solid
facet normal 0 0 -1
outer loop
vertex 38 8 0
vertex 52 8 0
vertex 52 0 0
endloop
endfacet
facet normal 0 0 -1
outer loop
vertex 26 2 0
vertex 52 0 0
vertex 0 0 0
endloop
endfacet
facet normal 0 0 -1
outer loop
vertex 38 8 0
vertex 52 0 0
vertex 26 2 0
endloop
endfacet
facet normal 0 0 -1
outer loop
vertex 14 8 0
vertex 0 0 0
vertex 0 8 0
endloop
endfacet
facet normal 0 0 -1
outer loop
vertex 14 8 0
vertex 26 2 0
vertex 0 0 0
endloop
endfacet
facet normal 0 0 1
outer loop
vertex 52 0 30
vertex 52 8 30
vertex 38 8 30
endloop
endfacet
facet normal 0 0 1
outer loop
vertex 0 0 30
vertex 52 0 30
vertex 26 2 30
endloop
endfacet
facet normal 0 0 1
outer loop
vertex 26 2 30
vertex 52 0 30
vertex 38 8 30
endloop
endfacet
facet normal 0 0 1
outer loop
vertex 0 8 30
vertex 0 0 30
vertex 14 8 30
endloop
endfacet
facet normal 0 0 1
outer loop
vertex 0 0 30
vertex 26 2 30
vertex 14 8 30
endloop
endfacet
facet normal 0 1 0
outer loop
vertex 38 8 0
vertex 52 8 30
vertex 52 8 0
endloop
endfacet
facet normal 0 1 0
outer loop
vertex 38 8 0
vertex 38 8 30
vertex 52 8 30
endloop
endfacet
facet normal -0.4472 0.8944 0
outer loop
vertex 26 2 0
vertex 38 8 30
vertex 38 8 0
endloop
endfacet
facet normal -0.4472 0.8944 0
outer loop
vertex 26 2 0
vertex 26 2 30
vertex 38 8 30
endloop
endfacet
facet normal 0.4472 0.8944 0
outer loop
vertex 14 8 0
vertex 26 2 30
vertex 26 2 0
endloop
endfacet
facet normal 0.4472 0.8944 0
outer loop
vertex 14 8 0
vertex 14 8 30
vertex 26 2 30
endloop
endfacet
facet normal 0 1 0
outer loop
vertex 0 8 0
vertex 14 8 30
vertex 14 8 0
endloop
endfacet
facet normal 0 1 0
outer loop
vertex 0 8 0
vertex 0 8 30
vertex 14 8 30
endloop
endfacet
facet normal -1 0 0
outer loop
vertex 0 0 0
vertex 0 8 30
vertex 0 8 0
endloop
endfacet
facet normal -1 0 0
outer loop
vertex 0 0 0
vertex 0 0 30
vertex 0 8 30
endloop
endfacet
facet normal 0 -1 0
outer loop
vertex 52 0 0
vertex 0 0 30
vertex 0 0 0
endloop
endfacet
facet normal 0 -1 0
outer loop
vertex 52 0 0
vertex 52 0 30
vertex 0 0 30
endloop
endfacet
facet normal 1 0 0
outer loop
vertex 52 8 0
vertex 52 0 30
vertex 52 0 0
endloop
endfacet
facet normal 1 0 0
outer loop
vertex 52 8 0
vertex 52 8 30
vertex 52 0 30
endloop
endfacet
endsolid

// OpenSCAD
$fn = 32;

// ----------------------------------------------------------------------
// V guide rail: vway, 52 mm wide
// ----------------------------------------------------------------------

// --- parameters (mm) ---
rail_w = 52;              // rail width, X
base_t = 8;               // base plate thickness
v_depth = 6;              // V feature depth / height
v_half_w = 12;            // half width of the V at the base face
plate_t = 30;             // rail length, Z (the extrusion height)

profile = [[0, 0], [52, 0], [52, 8], [38, 8], [26, 2], [14, 8], [0, 8]];  // primary outline, 7 points, counter clockwise

// --- the one profile operation ---
linear_extrude(height = plate_t) polygon(points = profile);
